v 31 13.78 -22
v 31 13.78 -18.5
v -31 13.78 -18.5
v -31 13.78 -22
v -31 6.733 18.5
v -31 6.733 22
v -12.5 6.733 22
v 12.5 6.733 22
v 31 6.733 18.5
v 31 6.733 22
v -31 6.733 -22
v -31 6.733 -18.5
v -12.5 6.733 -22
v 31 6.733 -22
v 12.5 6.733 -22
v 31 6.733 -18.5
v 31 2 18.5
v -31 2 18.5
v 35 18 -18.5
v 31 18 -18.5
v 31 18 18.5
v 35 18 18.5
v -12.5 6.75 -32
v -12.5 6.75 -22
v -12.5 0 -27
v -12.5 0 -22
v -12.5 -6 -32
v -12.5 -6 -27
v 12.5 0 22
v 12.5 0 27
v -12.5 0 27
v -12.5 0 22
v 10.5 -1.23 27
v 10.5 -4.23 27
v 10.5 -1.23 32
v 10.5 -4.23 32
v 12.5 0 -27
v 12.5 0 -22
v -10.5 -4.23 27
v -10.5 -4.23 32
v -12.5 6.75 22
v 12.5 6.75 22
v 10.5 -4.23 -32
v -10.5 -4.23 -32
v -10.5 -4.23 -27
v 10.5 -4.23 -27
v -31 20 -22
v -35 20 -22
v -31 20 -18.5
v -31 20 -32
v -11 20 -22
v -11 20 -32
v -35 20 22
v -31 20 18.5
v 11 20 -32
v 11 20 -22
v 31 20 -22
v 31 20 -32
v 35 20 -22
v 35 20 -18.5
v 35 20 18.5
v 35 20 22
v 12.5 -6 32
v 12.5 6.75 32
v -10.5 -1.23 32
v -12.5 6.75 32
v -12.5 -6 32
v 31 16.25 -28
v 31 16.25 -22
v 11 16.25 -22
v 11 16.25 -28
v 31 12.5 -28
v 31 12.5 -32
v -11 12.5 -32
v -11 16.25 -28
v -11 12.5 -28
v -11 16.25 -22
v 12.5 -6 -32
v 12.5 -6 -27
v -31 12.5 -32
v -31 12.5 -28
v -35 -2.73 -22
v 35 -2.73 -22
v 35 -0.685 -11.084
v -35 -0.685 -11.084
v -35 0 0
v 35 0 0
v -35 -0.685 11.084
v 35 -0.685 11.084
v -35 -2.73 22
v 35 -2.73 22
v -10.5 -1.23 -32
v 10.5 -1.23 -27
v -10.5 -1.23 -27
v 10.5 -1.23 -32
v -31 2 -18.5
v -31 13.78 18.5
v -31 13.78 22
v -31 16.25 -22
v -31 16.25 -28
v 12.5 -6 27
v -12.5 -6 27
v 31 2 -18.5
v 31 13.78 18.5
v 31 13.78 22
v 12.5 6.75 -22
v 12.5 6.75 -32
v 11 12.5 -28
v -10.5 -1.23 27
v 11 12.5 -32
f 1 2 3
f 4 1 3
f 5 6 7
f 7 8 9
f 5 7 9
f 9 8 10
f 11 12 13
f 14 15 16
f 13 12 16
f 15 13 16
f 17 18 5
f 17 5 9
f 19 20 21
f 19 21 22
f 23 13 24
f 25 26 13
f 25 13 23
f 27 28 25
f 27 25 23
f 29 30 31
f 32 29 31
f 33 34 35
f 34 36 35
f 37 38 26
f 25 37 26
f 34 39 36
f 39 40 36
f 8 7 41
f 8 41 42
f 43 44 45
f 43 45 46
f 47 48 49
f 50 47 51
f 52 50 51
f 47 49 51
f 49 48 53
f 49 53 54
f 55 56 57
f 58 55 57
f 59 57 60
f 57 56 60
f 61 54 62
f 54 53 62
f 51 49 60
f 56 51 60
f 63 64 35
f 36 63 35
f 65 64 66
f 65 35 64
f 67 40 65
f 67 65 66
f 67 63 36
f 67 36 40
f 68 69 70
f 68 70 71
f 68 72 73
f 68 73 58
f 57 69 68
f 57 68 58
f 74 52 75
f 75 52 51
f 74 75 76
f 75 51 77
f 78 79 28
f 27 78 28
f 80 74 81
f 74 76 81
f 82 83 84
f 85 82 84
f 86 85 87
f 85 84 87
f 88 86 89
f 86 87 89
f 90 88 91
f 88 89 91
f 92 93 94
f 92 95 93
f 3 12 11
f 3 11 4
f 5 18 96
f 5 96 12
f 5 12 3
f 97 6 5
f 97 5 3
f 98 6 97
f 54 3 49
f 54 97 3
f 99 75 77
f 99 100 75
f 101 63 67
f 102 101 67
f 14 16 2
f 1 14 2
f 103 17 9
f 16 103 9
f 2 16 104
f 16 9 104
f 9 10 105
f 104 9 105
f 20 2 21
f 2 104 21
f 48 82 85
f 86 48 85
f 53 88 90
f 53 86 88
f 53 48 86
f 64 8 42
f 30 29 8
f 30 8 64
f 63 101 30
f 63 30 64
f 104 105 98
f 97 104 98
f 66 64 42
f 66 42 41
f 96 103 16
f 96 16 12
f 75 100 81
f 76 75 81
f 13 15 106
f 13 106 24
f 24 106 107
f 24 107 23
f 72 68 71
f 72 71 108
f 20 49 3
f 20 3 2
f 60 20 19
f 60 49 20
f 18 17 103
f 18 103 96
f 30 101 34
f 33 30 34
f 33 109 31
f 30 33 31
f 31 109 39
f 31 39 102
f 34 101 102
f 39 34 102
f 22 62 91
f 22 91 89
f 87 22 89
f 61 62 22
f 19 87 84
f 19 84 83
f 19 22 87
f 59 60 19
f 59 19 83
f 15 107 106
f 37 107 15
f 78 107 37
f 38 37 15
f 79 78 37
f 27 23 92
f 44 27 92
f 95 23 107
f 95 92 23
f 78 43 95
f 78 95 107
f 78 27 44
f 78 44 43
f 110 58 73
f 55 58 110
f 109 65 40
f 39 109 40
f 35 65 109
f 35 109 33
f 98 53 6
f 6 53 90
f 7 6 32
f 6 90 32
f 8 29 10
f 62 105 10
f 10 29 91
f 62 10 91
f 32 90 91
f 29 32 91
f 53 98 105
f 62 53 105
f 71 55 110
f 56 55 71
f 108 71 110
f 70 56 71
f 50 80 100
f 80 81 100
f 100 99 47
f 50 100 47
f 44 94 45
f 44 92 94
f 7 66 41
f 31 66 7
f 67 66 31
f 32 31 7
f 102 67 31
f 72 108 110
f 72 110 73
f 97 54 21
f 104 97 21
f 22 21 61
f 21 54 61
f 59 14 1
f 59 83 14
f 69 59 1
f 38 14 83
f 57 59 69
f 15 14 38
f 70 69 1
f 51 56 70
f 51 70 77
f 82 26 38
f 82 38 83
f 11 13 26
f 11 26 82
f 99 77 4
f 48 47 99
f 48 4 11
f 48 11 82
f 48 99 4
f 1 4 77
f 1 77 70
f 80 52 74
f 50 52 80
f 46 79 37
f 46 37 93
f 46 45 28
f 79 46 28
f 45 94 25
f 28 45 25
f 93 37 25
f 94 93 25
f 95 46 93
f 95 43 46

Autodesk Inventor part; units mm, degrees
ref_plane "YZ Plane" through (0, 0, 0) normal (1, 0, 0) x (0, 1, 0)
ref_plane "XZ Plane" through (0, 0, 0) normal (0, 1, 0) x (-1, 0, 0)
ref_plane "XY Plane" through (0, 0, 0) normal (0, 0, 1) x (1, 0, 0)
sketch "Sketch1" plane through (0, 0, 0) normal (0, 1, 0) x (-1, 0, 0)
  line L0 (-31, -18.5) -> (31, -18.5)
  line L1 (31, -18.5) -> (31, 18.5)
  line L2 (31, 18.5) -> (-31, 18.5)
  line L3 (-31, 18.5) -> (-31, -18.5)
  line L4 (-31, -18.5) -> (31, 18.5) construction
  line L5 (31, -18.5) -> (-31, 18.5) construction
  line L6 (-35, -22) -> (35, -22)
  line L7 (35, -22) -> (35, 22)
  line L8 (35, 22) -> (-35, 22)
  line L9 (-35, 22) -> (-35, -22)
  line L10 (-35, -22) -> (35, 22) construction
  line L11 (35, -22) -> (-35, 22) construction
  line L12 (12.5, -32) -> (-12.5, -32)
  line L13 (0, -22) -> (12.5, -32) construction
  line L14 (0, -22) -> (-12.5, -32) construction
  line L15 (-12.5, 32) -> (12.5, 32)
  line L16 (12.5, 32) -> (12.5, 22)
  line L17 (-12.5, 22) -> (-12.5, 32)
  line L18 (-12.5, 32) -> (0, 22) construction
  line L19 (12.5, 32) -> (0, 22) construction
  line L20 (12.5, -22) -> (12.5, -32)
  line L21 (-12.5, -32) -> (-12.5, -22)
  line L22 (-12.5, -27) -> (12.5, -27)
  line L23 (-12.5, 27) -> (12.5, 27)
  line L24 (-35, -22) -> (-35, -18.5)
  line L25 (-35, 22) -> (-31, 22)
  line L26 (-35, 22) -> (-35, 18.5)
  point P0 (0, 0)
  dimension "d2" = 70
  dimension "d3" = 44
  dimension "d16" = 25
  dimension "d97" = 37
extrude "Extrusion2" add sketch "Sketch1" along normal blind 20 contours L9 L8 L7 L6
extrude "Extrusion3" add sketch "Sketch1" along normal blind 2 contours L3 L2 L1 L0
sketch "Sketch2" plane through (-35, 0, 22) normal (0, 0, 1) x (1, 0, 0)
  line L0 (66, 2) -> (66, 20) projected
  line L1 (4, 2) -> (4, 20) projected
  line L2 (66, 13.7796) -> (4, 13.7796)
  line L3 (4, 13.7796) -> (4, 6.7329)
  line L4 (4, 6.7329) -> (66, 6.7329)
  line L5 (66, 6.7329) -> (66, 13.7796)
  point P0 (35, 0)
extrude "Extrusion4" cut sketch "Sketch2" against normal blind 45
extrude "Extrusion5" add sketch "Sketch1" along normal blind 2 contours L6 L20 L22 L21 | L22 L20 L12 L21
extrude "Extrusion6" add sketch "Sketch1" along normal blind 2 contours L8 L17 L23 L16 | L23 L17 L15 L16
sketch "Sketch3" plane through (-12.5, 2, 32) normal (0, 0, 1) x (1, 0, 0)
  line L0 (2.5, -3.3793) -> (22.5, -3.3793)
  line L1 (22.5, -3.3793) -> (22.5, -4.9914)
  line L2 (22.5, -4.9914) -> (2.5, -4.9914)
  line L3 (2.5, -4.9914) -> (2.5, -3.3793)
  line L4 (25, -2) -> (25, 0) projected
  point P0 (12.5, -2)
  point P1 (25, -6)
  dimension "d28" = 20
  dimension "d29" = 2.5
extrude "Extrusion9" cut sketch "Sketch3" against normal blind 5
sketch "Sketch4" plane through (12.5, 2, -32) normal (0, 0, -1) x (-1, 0, 0)
  line L0 (2.5, -3.3796) -> (22.5, -3.3796)
  line L1 (22.5, -3.3796) -> (22.5, -4.9916)
  line L2 (22.5, -4.9916) -> (2.5, -4.9916)
  line L3 (2.5, -4.9916) -> (2.5, -3.3796)
  line L4 (25, -2) -> (25, 0) projected
  point P0 (12.5, -2)
  point P1 (25, -6)
  dimension "d32" = 20
  dimension "d34" = 2.5
extrude "Extrusion10" cut sketch "Sketch4" against normal blind 5
extrude "Extrusion11" add sketch "Sketch1" against normal blind 10 contours L9 L8 L7 L6
extrude "Extrusion12" add sketch "Sketch1" against normal blind 10 contours L3 L2 L1 L0
sketch "Sketch5" plane through (35, 20, 22) normal (1, 0, 0) x (0, 0, -1)
  line L0 (22, -20) -> (22, -110)
  circle A0 centre (22, -110) radius 90
  dimension "d42" = 90
  dimension "d43" = 180
extrude "Extrusion13" cut sketch "Sketch5" against normal blind 70
sketch "Sketch6" plane through (35, 20, -22) normal (0, 0, -1) x (-1, 0, 0)
  point P0 (35, -20)
sketch "Sketch7" plane through (0, 20, 0) normal (0, 1, 0) x (1, 0, 0)
  line L0 (-31, 18.5) -> (31, 18.5) projected
  line L1 (31, 18.5) -> (35, 18.5)
  line L2 (35, -22) -> (35, 22) projected
  line L3 (31, 18.5) -> (31, -18.5) projected
  line L4 (31, -18.5) -> (36, -18.5)
  point P0 (0, 0)
sketch "Sketch8" plane through (31, 20, -18.5) normal (-1, 0, 0) x (0, 0, 1)
  line L0 (0, 0) -> (0, -2)
  line L1 (0, -2) -> (37, -2)
  line L2 (37, -6.2204) -> (37, 0) projected
  line L3 (37, -2) -> (37, 0)
  line L4 (37, -5.0018) -> (37, -7.0018)
  line L5 (40.5, 0) -> (-3.5, 0) projected
  line L6 (37, -7.0018) -> (2, -7.0018)
  line L7 (2, -7.0018) -> (2, -5.0018)
  point P0 (18.5, -20)
  dimension "d46" = 2
  dimension "d47" = 2
sketch "Sketch14" plane through (0, 20, 0) normal (0, 1, 0) x (1, 0, 0)
  line L0 (31, 18.5) -> (31, 22) projected
  line L1 (31, 18.5) -> (35, 18.5)
  line L2 (35, -22) -> (35, 22) projected
  line L3 (31, 18.5) -> (31, -18.5) projected
  line L4 (31, -18.5) -> (35, -18.5)
  line L5 (35, -18.5) -> (35, 18.5)
  line L6 (31, 18.5) -> (31, -18.5)
  line L7 (-31, 18.5) -> (31, 18.5) projected
  line L8 (31, -18.5) -> (-31, -18.5) projected
  line L9 (31, -18.5) -> (31, -14.9394)
extrude "Extrusion18" cut sketch "Sketch14" against normal blind 2
sketch "Sketch21" plane through (35, -2.7303, -22) normal (0, 0, -1) x (-1, 0, 0)
  line L0 (66, 15.2303) -> (66, 19.6201)
  line L1 (66, 16.5099) -> (66, 22.7303) projected
  line L2 (66, 22.7303) -> (46, 22.7303)
  line L3 (46, 22.7303) -> (46, 15.2303)
  line L4 (46, 15.2303) -> (66, 15.2303)
  line L5 (66, 22.7303) -> (66, 15.2303)
  point P0 (35, 2.7303)
  dimension "d84" = 7.5
  dimension "d91" = 20
sketch "Sketch25" plane through (31, 6.7329, -22) normal (0, 0, -1) x (-1, 0, 0)
  line L0 (0, 7.0467) -> (62, 7.0467) projected
  line L1 (0, 7.0467) -> (0, 13.2671)
  line L2 (66, 13.2671) -> (-4, 13.2671) projected
  line L3 (0, 13.2671) -> (20, 13.2671)
  line L4 (20, 13.2671) -> (20, 5.7671)
  line L5 (20, 5.7671) -> (0, 5.7671)
  line L6 (0, 5.7671) -> (0, 13.2671)
  point P0 (31, -6.7329)
  dimension "d98" = 20
  dimension "d99" = 7.5
extrude "Extrusion29" add sketch "Sketch1" against normal blind 6 contours L22 L20 L12 L21
extrude "Extrusion30" add sketch "Sketch1" against normal blind 6 contours L23 L17 L15 L16
sketch "Sketch28" plane through (12.5, 2, -32) normal (0, 0, -1) x (-1, 0, 0)
  line L0 (2, -3.2303) -> (23, -3.2303)
  line L1 (23, -3.2303) -> (23, -6.2303)
  line L2 (23, -6.2303) -> (2, -6.2303)
  line L3 (2, -6.2303) -> (2, -3.2303)
  line L4 (-22.5, -4.7303) -> (47.5, -4.7303) projected
  line L5 (2, -3.2303) -> (23, -6.2303) construction
  line L6 (23, -3.2303) -> (2, -6.2303) construction
  point P0 (12.5, -2)
  point P1 (12.5, -4.7303)
  dimension "d111" = 21
  dimension "d112" = 3
extrude "Extrusion31" cut sketch "Sketch28" against normal blind 6
sketch "Sketch29" plane through (-12.5, 2, 32) normal (0, 0, 1) x (1, 0, 0)
  line L0 (2, -3.2303) -> (23, -3.2303) projected
  line L1 (2, -6.2303) -> (23, -6.2303)
  line L2 (23, -6.2303) -> (23, -3.2303)
  line L3 (23, -3.2303) -> (2, -3.2303)
  line L4 (2, -3.2303) -> (2, -6.2303)
  line L5 (47.5, -4.7303) -> (-22.5, -4.7303) projected
  line L6 (2, -6.2303) -> (23, -3.2303) construction
  line L7 (23, -6.2303) -> (2, -3.2303) construction
  point P0 (12.5, -2)
  point P1 (12.5, -4.7303)
  dimension "d115" = 21
extrude "Extrusion32" cut sketch "Sketch29" against normal blind 6
sketch "Sketch30" plane through (-12.5, 0, -22) normal (-1, 0, 0) x (0, 0, 1)
  point P0 (22, 0)
extrude "Extrusion33" cut sketch "Sketch1" along normal blind 6.75 contours L8 L17 L23 L16 | L23 L17 L15 L16
extrude "Extrusion34" add sketch "Sketch1" along normal blind 6.75 contours L23 L17 L15 L16
extrude "Extrusion35" add sketch "Sketch1" along normal blind 6.75 contours L8 L17 L23 L16
extrude "Extrusion36" cut sketch "Sketch1" along normal blind 6.75 contours L6 L20 L22 L21
extrude "Extrusion37" add sketch "Sketch1" along normal blind 6.75 contours L6 L20 L22 L21 | L22 L20 L12 L21
extrude "Extrusion38" add sketch "Sketch25" along normal blind 10
extrude "Extrusion39" add sketch "Sketch21" along normal blind 10
sketch "Sketch32" plane through (-31, 13.7796, -22) normal (-1, 0, 0) x (0, 0, 1)
  line L0 (-10, 6.2204) -> (-10, -1.2796) projected
  line L1 (-6, 2.4704) -> (0, 2.4704)
  line L2 (0, -16.5099) -> (0, 6.2204) projected
  line L3 (-6, 2.4704) -> (-6, -1.2796)
  line L4 (0, -1.2796) -> (-10, -1.2796) projected
  line L5 (-6, -1.2796) -> (0, -1.2796)
  line L6 (0, 2.4704) -> (0, -1.2796)
  point P0 (22, -13.7796)
extrude "Extrusion40" cut sketch "Sketch32" against normal blind 20
sketch "Sketch33" plane through (31, 13.7796, -22) normal (1, 0, 0) x (0, 0, -1)
  line L0 (10, -1.2796) -> (10, 6.2204) projected
  line L1 (0, 2.4704) -> (6, 2.4704) projected
  line L2 (6, 2.4704) -> (6, -1.2796) projected
  line L3 (6, 2.4704) -> (6, -1.2796)
  line L4 (6, -1.2796) -> (6, 2.4704)
  line L5 (6, -1.2796) -> (0, -1.2796)
  line L6 (0, -1.2796) -> (0, 2.4704)
  line L7 (6, 2.4704) -> (0, 2.4704)
  point P0 (-22, -13.7796)
extrude "Extrusion41" cut sketch "Sketch33" against normal blind 20
sketch "Sketch34" plane through (0, 20, 0) normal (0, 1, 0) x (1, 0, 0)
  point P0 (0, 0)
properties part number "kotelon alaosa"
